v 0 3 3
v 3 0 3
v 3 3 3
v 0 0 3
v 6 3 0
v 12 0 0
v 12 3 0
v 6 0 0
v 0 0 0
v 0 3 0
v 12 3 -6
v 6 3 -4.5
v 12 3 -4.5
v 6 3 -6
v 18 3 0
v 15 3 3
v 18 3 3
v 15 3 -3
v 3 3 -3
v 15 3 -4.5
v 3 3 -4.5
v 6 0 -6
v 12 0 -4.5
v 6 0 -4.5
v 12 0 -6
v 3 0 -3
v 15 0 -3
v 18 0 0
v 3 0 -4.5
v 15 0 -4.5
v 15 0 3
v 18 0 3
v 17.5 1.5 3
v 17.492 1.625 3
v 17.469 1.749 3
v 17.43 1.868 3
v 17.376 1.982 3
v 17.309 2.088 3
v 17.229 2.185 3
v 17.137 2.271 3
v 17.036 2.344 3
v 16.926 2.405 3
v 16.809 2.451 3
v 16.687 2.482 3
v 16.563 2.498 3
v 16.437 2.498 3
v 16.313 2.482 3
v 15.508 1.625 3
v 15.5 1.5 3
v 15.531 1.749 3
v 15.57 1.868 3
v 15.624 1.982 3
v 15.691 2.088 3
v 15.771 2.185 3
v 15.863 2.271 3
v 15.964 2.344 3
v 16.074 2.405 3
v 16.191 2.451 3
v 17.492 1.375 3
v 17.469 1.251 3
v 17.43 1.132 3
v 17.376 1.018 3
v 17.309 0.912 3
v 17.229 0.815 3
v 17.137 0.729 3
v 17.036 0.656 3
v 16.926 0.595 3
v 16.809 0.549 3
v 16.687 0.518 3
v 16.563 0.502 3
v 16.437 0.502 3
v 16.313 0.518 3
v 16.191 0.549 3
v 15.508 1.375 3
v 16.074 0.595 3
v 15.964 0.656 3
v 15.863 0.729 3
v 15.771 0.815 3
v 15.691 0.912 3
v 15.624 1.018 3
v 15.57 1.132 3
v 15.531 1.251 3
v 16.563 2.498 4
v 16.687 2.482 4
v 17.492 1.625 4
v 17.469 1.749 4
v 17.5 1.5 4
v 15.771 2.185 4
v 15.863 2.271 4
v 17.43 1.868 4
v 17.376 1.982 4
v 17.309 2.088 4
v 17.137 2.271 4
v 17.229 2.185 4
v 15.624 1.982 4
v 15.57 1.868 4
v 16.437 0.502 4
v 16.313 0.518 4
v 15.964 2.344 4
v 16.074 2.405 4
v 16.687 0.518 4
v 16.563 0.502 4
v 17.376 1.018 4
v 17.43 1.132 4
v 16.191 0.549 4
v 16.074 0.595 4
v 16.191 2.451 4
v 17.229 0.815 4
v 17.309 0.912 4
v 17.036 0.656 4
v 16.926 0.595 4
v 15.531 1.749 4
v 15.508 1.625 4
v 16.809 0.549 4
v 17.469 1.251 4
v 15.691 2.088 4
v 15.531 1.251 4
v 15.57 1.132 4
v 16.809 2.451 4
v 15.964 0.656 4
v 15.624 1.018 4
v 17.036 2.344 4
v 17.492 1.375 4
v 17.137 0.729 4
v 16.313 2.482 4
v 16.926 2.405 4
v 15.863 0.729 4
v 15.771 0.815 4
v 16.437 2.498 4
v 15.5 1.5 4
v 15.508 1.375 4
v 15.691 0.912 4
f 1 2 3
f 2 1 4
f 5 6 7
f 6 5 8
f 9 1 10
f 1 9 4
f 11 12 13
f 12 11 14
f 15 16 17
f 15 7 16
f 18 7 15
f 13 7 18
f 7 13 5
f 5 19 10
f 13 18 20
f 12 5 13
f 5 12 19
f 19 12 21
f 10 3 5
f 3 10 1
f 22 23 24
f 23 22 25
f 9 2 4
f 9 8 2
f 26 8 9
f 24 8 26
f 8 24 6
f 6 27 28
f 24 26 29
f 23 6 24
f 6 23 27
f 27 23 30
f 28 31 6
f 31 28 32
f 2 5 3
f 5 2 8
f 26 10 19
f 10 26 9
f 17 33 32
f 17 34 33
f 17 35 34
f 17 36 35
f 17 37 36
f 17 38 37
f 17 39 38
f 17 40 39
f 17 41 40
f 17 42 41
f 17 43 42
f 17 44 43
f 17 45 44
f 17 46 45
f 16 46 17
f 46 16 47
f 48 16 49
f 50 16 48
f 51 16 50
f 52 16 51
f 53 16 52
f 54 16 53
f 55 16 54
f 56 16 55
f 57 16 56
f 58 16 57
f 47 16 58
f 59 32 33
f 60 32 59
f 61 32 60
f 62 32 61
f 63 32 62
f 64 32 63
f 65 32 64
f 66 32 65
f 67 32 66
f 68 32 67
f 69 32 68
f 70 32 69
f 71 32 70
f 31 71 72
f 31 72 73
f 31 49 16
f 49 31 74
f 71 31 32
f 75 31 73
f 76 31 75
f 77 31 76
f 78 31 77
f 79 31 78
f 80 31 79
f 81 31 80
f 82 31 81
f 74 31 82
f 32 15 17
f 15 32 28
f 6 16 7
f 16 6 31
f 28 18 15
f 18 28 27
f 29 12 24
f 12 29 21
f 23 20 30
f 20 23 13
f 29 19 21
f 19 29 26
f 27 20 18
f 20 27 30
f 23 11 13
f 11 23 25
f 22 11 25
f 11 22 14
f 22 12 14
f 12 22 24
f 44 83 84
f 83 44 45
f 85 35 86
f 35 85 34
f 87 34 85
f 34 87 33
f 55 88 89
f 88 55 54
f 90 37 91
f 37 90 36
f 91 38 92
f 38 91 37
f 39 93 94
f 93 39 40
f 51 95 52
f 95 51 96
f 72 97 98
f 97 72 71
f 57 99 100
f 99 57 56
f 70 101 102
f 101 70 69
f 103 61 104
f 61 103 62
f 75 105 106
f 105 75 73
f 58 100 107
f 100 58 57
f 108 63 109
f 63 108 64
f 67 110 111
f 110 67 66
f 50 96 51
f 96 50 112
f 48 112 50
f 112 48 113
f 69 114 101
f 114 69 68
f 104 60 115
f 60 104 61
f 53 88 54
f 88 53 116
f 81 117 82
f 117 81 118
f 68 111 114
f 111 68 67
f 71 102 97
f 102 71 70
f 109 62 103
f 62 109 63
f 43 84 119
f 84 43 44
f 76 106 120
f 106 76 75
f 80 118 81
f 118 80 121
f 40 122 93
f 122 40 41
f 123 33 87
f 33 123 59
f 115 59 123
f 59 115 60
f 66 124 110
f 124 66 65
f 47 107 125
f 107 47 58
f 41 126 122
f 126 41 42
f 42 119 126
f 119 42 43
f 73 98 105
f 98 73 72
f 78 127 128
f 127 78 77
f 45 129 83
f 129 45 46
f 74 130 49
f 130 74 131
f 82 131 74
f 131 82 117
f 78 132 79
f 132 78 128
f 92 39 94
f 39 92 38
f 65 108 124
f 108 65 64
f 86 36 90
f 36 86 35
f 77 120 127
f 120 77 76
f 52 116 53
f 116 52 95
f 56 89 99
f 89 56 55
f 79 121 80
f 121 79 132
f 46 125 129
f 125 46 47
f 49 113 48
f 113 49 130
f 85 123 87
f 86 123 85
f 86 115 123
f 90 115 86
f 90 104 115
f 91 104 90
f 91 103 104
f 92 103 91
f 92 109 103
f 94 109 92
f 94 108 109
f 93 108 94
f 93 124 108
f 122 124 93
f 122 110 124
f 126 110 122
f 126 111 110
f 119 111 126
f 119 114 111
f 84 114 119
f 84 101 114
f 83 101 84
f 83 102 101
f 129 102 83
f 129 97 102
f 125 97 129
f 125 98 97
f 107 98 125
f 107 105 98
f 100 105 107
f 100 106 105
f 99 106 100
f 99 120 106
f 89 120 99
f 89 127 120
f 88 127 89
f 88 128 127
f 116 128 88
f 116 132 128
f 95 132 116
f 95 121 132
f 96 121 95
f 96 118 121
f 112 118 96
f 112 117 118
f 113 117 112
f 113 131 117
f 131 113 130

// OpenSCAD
//define blocks
module block1() {
	cube([3,3,3]);
	translate([3,0,0]) {
		polyhedron (	
	    	points = [[0, 0, 3], [0, 3, 3], [0, 3, 0], [0, 0, 0], [3, 0, 0], [3, 3, 0]],
			triangles = [[0,3,2], [0,2,1], [3,0,4], [1,2,5], [0,5,4], [0,1,5],  [5,2,4], [4,2,3], ]);
	}
}
module block2() {
	cube([6,3,1.5]);
}
module block3() {
	cylinder(height=3, r=1, $fn=50);
}

//assemble blocks
//left top
color("red"){
	translate([0,0,0]) //to match code pattern
	rotate([0,0,0])
		block1();
}
color("blue"){
	translate([6,0,0])
	rotate([0,180,0]) //roate y
		block1();
}

//right top
color("red"){
	translate([18,3,0])
	rotate([0,0,180])
		block1();
}
color("blue"){
	translate([12,3,0])
	rotate([0,180,180]) 
		block1();
}

translate([6,0,-1.5])
block2();

color("green")
translate([6,0,-3])
block2();

translate([3,0,-4.5])
block2();

color("red")
translate([9,0,-4.5])
block2();

translate([6,0,-6])
block2();

translate([16.5,1.5,3])
block3();
